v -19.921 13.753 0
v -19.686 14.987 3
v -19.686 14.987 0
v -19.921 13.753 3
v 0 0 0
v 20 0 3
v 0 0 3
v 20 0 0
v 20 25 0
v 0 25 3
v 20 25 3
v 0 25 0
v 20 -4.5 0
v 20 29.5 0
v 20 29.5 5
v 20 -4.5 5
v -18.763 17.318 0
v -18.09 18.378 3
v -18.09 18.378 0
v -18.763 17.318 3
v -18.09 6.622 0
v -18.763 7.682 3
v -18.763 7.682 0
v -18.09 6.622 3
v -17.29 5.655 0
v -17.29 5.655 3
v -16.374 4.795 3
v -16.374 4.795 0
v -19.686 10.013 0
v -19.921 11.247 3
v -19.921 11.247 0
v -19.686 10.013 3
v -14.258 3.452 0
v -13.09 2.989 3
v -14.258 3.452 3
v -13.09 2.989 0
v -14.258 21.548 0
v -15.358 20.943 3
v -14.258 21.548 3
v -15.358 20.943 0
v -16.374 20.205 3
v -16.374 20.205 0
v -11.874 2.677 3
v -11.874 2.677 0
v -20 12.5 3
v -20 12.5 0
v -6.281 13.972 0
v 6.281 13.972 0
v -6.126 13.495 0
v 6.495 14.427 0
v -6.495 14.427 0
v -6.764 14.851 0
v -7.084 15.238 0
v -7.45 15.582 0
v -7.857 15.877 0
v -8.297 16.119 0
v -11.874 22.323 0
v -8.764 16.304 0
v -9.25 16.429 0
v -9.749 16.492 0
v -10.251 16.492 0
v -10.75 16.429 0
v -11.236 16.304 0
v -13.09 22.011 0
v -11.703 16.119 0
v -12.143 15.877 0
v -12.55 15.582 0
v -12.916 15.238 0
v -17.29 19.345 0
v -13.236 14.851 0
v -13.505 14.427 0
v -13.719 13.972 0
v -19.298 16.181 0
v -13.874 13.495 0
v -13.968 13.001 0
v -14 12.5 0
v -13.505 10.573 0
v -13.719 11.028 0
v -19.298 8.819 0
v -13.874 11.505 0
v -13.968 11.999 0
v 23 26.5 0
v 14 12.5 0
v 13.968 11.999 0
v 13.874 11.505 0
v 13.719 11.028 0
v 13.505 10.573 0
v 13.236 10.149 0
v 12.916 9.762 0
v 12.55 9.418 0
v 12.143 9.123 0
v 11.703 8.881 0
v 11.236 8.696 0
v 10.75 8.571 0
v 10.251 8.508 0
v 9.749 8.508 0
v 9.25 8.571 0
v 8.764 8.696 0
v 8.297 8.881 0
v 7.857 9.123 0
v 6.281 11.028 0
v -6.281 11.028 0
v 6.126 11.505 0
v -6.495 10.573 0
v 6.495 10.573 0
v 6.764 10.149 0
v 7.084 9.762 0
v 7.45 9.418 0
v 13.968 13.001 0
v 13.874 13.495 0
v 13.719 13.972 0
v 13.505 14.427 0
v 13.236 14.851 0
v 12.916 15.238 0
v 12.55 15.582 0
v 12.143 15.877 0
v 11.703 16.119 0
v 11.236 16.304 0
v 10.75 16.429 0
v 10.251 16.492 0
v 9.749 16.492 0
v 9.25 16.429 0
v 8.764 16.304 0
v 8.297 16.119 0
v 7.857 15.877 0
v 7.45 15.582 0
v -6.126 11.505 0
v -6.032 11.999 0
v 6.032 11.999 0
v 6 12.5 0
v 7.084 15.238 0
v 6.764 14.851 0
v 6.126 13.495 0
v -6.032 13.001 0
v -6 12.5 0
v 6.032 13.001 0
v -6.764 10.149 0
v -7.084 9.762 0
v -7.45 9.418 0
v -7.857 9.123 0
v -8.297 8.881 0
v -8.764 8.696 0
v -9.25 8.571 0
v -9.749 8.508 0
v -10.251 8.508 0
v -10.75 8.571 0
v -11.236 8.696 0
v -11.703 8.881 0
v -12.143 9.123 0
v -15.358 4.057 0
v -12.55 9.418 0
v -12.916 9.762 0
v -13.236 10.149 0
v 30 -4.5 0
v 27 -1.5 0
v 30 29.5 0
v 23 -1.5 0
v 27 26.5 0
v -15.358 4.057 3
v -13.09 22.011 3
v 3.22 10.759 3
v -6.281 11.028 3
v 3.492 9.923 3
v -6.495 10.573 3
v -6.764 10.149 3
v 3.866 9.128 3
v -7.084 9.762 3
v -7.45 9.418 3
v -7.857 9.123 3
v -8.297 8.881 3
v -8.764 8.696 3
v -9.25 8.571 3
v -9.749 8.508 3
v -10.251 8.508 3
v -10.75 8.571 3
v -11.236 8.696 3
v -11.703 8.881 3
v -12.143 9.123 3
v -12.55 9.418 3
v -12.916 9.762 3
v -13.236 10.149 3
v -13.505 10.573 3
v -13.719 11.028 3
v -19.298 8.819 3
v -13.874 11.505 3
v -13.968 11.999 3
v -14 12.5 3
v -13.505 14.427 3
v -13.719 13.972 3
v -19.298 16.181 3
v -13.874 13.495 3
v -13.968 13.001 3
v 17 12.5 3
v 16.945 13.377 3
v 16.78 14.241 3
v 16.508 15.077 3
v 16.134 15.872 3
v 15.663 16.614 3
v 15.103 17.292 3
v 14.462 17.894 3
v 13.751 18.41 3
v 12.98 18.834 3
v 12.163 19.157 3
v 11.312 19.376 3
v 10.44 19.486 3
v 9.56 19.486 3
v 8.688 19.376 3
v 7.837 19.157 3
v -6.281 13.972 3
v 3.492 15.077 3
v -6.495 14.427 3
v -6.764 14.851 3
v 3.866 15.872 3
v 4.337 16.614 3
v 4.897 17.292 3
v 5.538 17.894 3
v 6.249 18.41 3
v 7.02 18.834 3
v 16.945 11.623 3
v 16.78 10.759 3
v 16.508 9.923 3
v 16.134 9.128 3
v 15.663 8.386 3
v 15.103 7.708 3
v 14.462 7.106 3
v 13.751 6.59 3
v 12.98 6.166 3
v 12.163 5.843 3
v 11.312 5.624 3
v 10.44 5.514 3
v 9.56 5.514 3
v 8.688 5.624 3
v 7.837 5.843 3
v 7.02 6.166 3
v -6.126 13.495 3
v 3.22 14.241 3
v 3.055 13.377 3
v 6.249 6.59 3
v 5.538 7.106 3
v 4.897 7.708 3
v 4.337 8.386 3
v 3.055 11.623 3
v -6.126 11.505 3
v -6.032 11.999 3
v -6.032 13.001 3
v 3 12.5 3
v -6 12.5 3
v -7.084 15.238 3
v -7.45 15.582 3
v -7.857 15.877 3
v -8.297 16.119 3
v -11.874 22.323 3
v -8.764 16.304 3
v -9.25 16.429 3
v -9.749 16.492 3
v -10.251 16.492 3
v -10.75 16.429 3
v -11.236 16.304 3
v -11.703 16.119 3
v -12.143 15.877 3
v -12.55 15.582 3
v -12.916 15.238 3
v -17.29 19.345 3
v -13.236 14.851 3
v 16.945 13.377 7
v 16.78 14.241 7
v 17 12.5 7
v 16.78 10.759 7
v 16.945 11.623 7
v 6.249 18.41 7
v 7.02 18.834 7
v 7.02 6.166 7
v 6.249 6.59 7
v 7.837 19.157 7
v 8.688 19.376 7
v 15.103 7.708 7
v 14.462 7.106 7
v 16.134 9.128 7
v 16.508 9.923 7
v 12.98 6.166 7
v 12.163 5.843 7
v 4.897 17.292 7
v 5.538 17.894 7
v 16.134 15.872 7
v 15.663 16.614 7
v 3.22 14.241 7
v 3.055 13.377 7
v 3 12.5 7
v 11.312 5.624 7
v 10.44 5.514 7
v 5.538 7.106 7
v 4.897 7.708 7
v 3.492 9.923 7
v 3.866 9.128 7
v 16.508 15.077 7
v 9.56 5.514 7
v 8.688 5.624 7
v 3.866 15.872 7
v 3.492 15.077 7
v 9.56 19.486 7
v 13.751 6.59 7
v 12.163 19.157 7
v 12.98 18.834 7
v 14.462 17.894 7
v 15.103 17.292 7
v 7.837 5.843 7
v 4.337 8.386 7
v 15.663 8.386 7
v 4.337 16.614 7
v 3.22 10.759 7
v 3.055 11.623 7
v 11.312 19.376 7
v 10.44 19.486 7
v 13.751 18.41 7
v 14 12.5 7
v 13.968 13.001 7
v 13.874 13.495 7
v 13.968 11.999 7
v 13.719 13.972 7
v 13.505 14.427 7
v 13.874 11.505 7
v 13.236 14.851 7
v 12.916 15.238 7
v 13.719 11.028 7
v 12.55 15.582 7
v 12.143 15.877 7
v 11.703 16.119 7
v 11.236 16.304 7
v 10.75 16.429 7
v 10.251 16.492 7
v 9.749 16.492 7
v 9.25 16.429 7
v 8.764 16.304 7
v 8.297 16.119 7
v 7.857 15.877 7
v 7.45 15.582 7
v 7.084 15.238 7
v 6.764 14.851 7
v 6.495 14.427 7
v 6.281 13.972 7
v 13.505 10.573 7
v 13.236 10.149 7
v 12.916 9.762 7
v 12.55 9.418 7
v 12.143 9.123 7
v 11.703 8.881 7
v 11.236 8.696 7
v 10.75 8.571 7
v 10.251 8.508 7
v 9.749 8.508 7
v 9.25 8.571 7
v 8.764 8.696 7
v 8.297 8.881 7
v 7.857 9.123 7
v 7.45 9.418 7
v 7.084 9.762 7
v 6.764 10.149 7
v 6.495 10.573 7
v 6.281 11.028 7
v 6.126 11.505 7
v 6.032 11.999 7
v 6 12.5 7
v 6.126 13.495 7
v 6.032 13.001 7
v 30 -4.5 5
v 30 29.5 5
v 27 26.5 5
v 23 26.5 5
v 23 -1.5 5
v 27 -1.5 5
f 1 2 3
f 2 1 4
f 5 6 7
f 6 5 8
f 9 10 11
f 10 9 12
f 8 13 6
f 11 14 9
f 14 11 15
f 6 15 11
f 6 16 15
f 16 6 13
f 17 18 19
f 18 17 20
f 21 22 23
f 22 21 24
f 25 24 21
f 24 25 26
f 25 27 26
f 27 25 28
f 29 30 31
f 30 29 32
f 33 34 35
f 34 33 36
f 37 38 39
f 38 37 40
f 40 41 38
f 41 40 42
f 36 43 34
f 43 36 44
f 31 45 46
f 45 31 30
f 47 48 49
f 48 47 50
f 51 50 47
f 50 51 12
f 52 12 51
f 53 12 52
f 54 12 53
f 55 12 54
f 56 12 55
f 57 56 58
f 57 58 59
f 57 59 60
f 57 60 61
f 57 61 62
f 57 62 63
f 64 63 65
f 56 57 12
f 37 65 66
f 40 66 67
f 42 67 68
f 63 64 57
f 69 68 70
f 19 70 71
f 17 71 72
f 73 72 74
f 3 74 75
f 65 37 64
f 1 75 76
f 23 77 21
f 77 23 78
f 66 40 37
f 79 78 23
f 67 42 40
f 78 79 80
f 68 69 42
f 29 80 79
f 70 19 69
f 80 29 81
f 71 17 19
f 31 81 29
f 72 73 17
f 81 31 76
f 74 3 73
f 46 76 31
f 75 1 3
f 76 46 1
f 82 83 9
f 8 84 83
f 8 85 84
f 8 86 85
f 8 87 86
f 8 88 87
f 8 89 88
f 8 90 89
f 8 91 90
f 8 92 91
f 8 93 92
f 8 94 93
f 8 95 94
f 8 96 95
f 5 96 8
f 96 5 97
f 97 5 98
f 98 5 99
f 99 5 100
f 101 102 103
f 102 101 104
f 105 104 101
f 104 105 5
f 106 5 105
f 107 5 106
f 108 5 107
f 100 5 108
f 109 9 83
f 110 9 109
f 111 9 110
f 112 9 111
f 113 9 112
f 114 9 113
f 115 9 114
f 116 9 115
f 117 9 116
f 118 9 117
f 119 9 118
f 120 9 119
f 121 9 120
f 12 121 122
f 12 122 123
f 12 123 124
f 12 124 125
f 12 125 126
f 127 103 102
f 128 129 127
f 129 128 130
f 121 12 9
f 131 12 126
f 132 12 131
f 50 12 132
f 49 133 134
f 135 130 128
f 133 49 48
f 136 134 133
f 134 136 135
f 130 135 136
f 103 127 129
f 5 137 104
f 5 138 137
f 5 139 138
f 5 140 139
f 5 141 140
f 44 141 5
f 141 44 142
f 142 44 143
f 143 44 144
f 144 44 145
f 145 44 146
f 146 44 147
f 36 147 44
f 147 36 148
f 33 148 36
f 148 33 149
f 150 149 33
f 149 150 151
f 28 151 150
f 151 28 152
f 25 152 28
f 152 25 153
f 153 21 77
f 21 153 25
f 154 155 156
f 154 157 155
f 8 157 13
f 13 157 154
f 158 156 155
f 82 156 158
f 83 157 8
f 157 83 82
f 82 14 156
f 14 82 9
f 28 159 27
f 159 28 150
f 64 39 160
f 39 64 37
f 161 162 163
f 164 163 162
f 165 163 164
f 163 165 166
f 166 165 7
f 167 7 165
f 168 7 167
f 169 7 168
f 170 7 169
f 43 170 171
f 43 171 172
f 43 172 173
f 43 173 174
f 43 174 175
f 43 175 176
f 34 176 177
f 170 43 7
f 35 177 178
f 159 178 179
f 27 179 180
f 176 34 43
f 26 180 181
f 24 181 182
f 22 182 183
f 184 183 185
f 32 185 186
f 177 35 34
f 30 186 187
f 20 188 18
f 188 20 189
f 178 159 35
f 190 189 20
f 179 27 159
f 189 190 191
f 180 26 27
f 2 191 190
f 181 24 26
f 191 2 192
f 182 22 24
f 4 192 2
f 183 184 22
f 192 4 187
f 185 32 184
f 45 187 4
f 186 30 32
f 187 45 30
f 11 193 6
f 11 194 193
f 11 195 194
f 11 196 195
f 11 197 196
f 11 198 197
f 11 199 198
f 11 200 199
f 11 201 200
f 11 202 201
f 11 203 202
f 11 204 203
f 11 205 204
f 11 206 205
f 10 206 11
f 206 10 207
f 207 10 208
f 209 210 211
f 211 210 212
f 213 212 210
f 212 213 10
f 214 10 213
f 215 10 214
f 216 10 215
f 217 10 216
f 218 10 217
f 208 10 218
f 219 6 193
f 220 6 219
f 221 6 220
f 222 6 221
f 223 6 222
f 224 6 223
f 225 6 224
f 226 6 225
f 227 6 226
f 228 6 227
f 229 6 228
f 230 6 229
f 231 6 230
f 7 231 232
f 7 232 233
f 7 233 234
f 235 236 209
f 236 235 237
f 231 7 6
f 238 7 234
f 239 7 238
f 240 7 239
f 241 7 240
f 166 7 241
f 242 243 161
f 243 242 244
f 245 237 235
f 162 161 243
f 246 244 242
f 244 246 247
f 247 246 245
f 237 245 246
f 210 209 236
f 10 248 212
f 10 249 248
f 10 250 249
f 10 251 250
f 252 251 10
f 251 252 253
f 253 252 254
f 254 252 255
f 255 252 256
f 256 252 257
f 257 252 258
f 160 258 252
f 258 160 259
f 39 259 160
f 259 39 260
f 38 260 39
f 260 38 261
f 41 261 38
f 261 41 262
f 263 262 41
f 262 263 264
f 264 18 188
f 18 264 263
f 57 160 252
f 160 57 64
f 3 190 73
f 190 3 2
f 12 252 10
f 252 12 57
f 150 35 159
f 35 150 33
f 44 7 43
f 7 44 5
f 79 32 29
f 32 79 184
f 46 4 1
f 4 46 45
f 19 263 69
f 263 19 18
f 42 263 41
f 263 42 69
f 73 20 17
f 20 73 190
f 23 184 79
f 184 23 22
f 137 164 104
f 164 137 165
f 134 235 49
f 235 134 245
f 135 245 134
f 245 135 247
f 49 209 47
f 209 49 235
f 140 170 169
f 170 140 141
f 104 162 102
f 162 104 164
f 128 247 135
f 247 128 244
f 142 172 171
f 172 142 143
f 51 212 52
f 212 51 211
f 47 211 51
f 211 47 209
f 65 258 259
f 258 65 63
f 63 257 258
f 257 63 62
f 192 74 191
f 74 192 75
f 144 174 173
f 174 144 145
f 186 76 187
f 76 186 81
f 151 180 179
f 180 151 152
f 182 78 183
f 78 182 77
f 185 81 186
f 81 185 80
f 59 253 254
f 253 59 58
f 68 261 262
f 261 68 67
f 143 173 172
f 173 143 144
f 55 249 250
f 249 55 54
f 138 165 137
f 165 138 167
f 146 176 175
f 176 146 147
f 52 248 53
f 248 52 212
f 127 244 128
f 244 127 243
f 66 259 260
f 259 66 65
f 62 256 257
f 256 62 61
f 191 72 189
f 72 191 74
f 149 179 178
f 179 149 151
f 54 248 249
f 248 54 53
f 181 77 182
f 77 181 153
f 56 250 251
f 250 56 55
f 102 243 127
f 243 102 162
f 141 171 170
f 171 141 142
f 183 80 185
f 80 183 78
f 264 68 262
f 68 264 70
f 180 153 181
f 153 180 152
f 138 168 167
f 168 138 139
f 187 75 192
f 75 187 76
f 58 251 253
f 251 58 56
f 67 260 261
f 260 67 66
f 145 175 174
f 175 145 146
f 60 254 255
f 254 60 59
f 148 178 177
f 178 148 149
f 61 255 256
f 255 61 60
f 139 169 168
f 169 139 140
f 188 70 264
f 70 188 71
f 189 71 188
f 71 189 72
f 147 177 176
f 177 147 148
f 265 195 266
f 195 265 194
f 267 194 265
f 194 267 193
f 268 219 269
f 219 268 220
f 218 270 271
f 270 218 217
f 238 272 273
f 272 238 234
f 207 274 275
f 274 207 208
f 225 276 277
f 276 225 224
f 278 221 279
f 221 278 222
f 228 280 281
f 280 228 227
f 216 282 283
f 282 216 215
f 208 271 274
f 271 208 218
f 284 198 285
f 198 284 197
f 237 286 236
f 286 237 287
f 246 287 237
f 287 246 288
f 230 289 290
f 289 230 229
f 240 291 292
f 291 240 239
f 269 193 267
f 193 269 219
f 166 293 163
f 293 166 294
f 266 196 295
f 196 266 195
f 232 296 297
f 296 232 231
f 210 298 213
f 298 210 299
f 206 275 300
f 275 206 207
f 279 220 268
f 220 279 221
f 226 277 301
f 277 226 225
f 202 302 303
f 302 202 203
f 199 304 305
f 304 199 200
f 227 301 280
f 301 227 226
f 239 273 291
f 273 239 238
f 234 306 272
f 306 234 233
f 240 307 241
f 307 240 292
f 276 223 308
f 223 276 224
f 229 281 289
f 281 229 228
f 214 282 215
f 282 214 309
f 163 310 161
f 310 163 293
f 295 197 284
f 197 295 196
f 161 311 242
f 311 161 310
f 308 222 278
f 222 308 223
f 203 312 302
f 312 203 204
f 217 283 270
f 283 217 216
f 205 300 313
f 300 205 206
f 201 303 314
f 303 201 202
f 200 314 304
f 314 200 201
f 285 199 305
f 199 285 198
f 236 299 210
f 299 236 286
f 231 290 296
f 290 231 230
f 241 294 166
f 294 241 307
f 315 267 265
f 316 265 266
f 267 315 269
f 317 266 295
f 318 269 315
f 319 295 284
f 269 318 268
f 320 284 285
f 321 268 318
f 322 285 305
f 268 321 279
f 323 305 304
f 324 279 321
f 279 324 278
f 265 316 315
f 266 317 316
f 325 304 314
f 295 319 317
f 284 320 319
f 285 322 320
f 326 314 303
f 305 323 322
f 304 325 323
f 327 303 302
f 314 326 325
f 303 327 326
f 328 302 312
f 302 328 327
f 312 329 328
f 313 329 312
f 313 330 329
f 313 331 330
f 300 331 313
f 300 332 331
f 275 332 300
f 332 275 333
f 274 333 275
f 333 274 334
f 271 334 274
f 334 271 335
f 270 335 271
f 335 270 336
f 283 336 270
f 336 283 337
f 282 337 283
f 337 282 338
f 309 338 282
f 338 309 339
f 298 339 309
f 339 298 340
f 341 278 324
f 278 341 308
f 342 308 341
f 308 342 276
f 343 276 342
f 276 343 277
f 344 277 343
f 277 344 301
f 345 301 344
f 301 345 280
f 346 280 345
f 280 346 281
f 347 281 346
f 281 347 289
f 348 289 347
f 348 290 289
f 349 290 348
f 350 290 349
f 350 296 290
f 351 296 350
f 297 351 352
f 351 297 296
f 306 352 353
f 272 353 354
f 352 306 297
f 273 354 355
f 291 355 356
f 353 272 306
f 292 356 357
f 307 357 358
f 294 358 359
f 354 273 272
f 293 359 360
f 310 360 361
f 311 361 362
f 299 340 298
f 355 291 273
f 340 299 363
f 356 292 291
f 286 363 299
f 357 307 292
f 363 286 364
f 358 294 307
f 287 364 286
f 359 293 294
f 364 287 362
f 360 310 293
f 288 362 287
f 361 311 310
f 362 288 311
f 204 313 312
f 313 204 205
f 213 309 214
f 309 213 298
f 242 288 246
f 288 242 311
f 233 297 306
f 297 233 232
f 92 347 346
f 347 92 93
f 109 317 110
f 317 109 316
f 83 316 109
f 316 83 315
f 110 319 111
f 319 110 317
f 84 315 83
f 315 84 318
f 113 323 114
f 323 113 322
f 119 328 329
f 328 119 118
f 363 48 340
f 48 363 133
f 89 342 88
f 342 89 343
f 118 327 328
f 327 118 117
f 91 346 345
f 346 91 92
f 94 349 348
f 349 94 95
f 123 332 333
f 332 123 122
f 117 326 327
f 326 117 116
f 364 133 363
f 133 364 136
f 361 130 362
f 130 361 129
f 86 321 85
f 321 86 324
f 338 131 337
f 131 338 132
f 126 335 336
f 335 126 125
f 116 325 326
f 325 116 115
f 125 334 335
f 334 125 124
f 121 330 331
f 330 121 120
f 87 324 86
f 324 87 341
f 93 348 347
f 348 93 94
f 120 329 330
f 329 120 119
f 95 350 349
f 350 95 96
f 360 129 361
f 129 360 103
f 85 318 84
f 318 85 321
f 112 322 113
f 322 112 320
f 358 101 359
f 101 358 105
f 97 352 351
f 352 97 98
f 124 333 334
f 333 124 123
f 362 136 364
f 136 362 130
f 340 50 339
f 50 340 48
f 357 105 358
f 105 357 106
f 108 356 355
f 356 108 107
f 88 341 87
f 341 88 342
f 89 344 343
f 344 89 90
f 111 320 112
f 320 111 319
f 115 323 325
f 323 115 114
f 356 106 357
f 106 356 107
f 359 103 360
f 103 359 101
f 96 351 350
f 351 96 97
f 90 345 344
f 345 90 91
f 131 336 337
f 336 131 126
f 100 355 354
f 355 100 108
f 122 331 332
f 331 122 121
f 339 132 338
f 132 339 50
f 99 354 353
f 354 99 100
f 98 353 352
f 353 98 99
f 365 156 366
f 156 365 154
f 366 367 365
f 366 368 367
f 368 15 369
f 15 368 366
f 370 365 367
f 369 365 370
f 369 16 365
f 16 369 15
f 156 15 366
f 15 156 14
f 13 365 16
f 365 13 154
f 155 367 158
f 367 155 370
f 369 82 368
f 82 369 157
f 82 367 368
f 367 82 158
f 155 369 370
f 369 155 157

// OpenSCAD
$fn=50;
difference(){
union(){
difference(){
hull (){cube( [20,25,3]) ;
 
        translate([-10,12.5,0]) cylinder(3,10,10);    
       };
            translate([-10,12.5,-0.1]) cylinder(3.2,4,4);
            };
    translate([10,12.5,0]) cylinder (7,7,7);
                 
              
                
          };
        translate([10,12.5,-0.1]) cylinder (7.2,4,4);
      };
   difference(){  translate([20,-4.5,0]) cube([10,34,5]);
      translate([23,-1.5,-0.5]) cube([4,28,6]);
   };
